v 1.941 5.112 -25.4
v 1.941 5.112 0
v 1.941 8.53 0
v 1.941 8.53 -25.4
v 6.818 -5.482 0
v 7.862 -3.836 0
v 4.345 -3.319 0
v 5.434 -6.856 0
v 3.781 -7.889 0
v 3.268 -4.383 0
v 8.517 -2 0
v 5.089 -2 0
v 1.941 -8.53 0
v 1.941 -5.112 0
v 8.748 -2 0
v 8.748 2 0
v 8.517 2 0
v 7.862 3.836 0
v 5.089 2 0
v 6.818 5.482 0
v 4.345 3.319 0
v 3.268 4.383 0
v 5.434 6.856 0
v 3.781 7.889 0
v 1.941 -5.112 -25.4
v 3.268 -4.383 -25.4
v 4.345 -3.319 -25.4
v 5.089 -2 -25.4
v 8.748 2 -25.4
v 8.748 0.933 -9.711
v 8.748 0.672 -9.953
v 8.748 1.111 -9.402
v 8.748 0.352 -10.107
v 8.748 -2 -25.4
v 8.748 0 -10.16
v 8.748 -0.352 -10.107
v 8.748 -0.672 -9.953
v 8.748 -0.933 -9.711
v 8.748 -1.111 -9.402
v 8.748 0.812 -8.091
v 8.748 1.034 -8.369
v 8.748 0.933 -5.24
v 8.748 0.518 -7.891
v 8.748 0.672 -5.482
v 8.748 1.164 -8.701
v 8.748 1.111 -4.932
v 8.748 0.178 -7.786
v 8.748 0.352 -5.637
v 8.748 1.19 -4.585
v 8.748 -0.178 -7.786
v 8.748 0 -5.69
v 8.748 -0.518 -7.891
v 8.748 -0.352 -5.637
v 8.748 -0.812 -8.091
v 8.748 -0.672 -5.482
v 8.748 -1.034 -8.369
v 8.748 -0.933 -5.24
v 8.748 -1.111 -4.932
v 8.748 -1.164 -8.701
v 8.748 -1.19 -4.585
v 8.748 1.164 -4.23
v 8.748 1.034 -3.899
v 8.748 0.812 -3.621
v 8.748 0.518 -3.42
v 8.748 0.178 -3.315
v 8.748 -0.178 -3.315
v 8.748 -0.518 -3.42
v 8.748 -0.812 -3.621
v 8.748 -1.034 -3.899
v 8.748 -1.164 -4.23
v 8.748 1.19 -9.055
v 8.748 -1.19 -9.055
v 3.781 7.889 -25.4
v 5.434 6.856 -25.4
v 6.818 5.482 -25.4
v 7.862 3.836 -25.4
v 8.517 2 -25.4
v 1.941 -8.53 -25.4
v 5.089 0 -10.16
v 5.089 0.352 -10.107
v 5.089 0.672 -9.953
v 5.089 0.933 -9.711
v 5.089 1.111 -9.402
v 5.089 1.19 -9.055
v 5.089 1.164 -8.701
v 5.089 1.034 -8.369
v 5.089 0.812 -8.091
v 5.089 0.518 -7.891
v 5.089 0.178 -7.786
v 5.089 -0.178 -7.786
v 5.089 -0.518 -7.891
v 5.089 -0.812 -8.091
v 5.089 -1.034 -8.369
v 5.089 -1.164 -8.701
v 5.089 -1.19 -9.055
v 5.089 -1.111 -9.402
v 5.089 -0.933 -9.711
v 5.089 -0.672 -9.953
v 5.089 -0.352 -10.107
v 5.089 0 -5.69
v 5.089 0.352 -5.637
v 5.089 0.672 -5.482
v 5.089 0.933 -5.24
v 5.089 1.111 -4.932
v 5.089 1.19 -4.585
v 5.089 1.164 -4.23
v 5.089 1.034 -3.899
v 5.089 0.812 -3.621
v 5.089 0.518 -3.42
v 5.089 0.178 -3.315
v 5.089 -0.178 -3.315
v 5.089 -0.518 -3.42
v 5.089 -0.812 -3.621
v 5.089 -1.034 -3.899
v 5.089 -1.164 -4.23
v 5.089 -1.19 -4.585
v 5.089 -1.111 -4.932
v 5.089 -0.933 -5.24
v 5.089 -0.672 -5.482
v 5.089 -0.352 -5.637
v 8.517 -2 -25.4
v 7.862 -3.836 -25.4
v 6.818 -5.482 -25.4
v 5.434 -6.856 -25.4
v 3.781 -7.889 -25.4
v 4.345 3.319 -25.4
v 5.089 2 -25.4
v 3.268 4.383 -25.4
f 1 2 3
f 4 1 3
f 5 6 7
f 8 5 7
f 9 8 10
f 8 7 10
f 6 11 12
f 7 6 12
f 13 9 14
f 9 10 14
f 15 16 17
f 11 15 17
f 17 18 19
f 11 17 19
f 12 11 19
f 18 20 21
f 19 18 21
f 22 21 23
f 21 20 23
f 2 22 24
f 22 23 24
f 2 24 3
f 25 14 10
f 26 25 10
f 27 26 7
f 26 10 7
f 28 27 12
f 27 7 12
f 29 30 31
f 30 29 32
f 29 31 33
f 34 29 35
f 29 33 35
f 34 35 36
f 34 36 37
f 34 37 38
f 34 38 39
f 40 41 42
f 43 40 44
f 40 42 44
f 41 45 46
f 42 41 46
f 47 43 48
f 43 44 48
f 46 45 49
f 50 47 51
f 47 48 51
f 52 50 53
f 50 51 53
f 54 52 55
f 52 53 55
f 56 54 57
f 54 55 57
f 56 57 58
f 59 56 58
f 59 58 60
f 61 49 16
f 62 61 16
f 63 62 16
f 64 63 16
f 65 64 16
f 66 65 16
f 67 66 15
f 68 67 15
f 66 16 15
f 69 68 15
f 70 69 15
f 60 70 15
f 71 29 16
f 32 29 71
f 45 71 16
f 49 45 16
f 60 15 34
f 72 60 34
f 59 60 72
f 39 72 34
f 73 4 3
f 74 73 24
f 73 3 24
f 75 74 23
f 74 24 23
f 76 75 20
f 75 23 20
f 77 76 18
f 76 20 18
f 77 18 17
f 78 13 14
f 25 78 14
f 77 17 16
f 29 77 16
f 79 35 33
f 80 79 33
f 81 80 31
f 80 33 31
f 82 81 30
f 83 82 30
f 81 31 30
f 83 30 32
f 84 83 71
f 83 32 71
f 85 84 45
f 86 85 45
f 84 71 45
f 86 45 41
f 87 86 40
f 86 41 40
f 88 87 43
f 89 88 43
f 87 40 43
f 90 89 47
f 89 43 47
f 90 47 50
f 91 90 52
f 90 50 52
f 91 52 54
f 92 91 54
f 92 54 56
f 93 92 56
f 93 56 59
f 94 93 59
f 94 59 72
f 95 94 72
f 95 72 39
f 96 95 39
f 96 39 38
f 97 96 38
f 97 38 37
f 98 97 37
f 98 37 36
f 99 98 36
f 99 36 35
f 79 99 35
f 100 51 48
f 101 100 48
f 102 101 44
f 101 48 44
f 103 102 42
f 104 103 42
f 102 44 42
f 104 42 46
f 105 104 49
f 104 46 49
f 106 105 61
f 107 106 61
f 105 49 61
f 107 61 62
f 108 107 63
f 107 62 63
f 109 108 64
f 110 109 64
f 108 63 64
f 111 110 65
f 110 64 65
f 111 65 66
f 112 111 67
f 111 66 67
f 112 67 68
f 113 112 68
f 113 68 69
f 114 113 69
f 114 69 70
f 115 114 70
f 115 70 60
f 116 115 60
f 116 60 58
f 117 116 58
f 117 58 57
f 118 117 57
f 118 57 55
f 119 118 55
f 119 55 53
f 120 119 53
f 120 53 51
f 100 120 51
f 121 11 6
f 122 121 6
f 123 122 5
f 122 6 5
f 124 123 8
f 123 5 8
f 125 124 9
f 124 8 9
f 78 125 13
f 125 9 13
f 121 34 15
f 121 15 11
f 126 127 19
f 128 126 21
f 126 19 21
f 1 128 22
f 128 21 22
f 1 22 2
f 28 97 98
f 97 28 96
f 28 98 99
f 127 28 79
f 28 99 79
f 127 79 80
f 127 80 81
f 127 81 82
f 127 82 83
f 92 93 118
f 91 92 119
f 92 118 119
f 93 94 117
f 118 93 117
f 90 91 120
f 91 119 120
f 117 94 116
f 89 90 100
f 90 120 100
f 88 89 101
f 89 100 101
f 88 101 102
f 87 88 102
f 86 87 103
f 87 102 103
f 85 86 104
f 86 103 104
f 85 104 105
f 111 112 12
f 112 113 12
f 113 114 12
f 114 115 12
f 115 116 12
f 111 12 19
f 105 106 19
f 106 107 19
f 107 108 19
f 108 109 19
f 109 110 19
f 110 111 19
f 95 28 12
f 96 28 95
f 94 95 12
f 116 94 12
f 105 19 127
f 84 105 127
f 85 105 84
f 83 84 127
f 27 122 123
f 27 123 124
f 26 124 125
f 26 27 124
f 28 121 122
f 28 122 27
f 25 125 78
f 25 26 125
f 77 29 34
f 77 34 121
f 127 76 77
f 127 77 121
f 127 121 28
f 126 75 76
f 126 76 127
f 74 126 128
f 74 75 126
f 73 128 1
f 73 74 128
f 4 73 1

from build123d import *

# Parameters (mm, degrees)
BOSS_EXTRUDE1_DEPTH = 25.4
SKETCH2_W           = 27.340735927
SKETCH2_H           = 19.391580929
CUT_EXTRUDE1_DEPTH  = 50
SKETCH4_R           = 1.1938
CUT_EXTRUDE2_DEPTH  = 50


with BuildPart() as part:
    # Sketch1 → Boss-Extrude1 (new body)
    with BuildSketch(Plane.XY):
        with BuildLine():
            Line((-8.516561995, -2.000000064), (-8.748247165, -2.000000064))
            Line((-8.748247165, -2.000000064), (-8.748247165, 2))
            Line((-8.748247165, 2), (-8.51656201, 2))
            ThreePointArc((-8.51656201, 2), (0, 8.748247165), (8.51656201, 2))
            Line((8.51656201, 2), (8.748247165, 2))
            Line((8.748247165, 2), (8.748247165, -2.000000064))
            Line((8.748247165, -2.000000064), (8.516561995, -2.000000064))
            ThreePointArc((8.516561995, -2.000000064), (0, -8.748247165), (-8.516561995, -2.000000064))
        make_face()
        with BuildLine():
            Line((-5.088737122, 2), (-5.088737097, -2.000000064))
            ThreePointArc((-5.088737097, -2.000000064), (0, -5.467654478), (5.088737097, -2.000000064))
            Line((5.088737097, -2.000000064), (5.088737122, 2))
            ThreePointArc((5.088737122, 2), (0, 5.467654478), (-5.088737122, 2))
        make_face(mode=Mode.SUBTRACT)
    extrude(amount=-BOSS_EXTRUDE1_DEPTH)

    # Sketch2 → Cut-Extrude1 (cut)
    with BuildSketch(Plane.XY):
        with Locations((-11.729632037, -0.299788476)):
            Rectangle(SKETCH2_W, SKETCH2_H)
    extrude(amount=-CUT_EXTRUDE1_DEPTH, mode=Mode.SUBTRACT)

    # Sketch4 → Cut-Extrude2 (cut)
    with BuildSketch(Plane(origin=(11.288247165, 0, 0), x_dir=(0, 0, -1), z_dir=(1, 0, 0))):
        with Locations((4.4958, 0)):
            Circle(SKETCH4_R)
        with Locations((8.9662, 0)):
            Circle(SKETCH4_R)
    extrude(amount=-CUT_EXTRUDE2_DEPTH, mode=Mode.SUBTRACT)


solid = part.part
